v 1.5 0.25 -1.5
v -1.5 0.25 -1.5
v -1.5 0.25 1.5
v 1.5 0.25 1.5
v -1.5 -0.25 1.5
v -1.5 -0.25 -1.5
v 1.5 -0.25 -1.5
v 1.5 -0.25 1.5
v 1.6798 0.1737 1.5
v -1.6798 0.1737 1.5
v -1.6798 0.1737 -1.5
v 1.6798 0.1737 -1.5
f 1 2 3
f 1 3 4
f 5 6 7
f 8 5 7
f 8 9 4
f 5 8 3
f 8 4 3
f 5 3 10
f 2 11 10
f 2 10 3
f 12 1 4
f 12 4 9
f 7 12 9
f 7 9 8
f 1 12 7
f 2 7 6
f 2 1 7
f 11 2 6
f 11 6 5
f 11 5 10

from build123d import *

# Parameters (mm, degrees)
BOSS_EXTRUDE1_DEPTH      = 1.5
BOSS_EXTRUDE1_DEPTH_BACK = 1.5
SKETCH2_W                = 3
SKETCH2_H                = 0.5


with BuildPart() as part:
    # Sketch2 → Boss-Extrude1 (new, two sides: drawn at the far end of the back side and taken through both)
    with BuildSketch(Plane.XY.offset(-BOSS_EXTRUDE1_DEPTH_BACK)):
        Polygon((-1.67983495, 0.173664593), (-1.5, 0.25), (-1.5, -0.25), align=None)
        Rectangle(SKETCH2_W, SKETCH2_H)
        Polygon((1.5, -0.25), (1.5, 0.25), (1.67983495, 0.173664593), align=None)
    extrude(amount=BOSS_EXTRUDE1_DEPTH + BOSS_EXTRUDE1_DEPTH_BACK)


solid = part.part
